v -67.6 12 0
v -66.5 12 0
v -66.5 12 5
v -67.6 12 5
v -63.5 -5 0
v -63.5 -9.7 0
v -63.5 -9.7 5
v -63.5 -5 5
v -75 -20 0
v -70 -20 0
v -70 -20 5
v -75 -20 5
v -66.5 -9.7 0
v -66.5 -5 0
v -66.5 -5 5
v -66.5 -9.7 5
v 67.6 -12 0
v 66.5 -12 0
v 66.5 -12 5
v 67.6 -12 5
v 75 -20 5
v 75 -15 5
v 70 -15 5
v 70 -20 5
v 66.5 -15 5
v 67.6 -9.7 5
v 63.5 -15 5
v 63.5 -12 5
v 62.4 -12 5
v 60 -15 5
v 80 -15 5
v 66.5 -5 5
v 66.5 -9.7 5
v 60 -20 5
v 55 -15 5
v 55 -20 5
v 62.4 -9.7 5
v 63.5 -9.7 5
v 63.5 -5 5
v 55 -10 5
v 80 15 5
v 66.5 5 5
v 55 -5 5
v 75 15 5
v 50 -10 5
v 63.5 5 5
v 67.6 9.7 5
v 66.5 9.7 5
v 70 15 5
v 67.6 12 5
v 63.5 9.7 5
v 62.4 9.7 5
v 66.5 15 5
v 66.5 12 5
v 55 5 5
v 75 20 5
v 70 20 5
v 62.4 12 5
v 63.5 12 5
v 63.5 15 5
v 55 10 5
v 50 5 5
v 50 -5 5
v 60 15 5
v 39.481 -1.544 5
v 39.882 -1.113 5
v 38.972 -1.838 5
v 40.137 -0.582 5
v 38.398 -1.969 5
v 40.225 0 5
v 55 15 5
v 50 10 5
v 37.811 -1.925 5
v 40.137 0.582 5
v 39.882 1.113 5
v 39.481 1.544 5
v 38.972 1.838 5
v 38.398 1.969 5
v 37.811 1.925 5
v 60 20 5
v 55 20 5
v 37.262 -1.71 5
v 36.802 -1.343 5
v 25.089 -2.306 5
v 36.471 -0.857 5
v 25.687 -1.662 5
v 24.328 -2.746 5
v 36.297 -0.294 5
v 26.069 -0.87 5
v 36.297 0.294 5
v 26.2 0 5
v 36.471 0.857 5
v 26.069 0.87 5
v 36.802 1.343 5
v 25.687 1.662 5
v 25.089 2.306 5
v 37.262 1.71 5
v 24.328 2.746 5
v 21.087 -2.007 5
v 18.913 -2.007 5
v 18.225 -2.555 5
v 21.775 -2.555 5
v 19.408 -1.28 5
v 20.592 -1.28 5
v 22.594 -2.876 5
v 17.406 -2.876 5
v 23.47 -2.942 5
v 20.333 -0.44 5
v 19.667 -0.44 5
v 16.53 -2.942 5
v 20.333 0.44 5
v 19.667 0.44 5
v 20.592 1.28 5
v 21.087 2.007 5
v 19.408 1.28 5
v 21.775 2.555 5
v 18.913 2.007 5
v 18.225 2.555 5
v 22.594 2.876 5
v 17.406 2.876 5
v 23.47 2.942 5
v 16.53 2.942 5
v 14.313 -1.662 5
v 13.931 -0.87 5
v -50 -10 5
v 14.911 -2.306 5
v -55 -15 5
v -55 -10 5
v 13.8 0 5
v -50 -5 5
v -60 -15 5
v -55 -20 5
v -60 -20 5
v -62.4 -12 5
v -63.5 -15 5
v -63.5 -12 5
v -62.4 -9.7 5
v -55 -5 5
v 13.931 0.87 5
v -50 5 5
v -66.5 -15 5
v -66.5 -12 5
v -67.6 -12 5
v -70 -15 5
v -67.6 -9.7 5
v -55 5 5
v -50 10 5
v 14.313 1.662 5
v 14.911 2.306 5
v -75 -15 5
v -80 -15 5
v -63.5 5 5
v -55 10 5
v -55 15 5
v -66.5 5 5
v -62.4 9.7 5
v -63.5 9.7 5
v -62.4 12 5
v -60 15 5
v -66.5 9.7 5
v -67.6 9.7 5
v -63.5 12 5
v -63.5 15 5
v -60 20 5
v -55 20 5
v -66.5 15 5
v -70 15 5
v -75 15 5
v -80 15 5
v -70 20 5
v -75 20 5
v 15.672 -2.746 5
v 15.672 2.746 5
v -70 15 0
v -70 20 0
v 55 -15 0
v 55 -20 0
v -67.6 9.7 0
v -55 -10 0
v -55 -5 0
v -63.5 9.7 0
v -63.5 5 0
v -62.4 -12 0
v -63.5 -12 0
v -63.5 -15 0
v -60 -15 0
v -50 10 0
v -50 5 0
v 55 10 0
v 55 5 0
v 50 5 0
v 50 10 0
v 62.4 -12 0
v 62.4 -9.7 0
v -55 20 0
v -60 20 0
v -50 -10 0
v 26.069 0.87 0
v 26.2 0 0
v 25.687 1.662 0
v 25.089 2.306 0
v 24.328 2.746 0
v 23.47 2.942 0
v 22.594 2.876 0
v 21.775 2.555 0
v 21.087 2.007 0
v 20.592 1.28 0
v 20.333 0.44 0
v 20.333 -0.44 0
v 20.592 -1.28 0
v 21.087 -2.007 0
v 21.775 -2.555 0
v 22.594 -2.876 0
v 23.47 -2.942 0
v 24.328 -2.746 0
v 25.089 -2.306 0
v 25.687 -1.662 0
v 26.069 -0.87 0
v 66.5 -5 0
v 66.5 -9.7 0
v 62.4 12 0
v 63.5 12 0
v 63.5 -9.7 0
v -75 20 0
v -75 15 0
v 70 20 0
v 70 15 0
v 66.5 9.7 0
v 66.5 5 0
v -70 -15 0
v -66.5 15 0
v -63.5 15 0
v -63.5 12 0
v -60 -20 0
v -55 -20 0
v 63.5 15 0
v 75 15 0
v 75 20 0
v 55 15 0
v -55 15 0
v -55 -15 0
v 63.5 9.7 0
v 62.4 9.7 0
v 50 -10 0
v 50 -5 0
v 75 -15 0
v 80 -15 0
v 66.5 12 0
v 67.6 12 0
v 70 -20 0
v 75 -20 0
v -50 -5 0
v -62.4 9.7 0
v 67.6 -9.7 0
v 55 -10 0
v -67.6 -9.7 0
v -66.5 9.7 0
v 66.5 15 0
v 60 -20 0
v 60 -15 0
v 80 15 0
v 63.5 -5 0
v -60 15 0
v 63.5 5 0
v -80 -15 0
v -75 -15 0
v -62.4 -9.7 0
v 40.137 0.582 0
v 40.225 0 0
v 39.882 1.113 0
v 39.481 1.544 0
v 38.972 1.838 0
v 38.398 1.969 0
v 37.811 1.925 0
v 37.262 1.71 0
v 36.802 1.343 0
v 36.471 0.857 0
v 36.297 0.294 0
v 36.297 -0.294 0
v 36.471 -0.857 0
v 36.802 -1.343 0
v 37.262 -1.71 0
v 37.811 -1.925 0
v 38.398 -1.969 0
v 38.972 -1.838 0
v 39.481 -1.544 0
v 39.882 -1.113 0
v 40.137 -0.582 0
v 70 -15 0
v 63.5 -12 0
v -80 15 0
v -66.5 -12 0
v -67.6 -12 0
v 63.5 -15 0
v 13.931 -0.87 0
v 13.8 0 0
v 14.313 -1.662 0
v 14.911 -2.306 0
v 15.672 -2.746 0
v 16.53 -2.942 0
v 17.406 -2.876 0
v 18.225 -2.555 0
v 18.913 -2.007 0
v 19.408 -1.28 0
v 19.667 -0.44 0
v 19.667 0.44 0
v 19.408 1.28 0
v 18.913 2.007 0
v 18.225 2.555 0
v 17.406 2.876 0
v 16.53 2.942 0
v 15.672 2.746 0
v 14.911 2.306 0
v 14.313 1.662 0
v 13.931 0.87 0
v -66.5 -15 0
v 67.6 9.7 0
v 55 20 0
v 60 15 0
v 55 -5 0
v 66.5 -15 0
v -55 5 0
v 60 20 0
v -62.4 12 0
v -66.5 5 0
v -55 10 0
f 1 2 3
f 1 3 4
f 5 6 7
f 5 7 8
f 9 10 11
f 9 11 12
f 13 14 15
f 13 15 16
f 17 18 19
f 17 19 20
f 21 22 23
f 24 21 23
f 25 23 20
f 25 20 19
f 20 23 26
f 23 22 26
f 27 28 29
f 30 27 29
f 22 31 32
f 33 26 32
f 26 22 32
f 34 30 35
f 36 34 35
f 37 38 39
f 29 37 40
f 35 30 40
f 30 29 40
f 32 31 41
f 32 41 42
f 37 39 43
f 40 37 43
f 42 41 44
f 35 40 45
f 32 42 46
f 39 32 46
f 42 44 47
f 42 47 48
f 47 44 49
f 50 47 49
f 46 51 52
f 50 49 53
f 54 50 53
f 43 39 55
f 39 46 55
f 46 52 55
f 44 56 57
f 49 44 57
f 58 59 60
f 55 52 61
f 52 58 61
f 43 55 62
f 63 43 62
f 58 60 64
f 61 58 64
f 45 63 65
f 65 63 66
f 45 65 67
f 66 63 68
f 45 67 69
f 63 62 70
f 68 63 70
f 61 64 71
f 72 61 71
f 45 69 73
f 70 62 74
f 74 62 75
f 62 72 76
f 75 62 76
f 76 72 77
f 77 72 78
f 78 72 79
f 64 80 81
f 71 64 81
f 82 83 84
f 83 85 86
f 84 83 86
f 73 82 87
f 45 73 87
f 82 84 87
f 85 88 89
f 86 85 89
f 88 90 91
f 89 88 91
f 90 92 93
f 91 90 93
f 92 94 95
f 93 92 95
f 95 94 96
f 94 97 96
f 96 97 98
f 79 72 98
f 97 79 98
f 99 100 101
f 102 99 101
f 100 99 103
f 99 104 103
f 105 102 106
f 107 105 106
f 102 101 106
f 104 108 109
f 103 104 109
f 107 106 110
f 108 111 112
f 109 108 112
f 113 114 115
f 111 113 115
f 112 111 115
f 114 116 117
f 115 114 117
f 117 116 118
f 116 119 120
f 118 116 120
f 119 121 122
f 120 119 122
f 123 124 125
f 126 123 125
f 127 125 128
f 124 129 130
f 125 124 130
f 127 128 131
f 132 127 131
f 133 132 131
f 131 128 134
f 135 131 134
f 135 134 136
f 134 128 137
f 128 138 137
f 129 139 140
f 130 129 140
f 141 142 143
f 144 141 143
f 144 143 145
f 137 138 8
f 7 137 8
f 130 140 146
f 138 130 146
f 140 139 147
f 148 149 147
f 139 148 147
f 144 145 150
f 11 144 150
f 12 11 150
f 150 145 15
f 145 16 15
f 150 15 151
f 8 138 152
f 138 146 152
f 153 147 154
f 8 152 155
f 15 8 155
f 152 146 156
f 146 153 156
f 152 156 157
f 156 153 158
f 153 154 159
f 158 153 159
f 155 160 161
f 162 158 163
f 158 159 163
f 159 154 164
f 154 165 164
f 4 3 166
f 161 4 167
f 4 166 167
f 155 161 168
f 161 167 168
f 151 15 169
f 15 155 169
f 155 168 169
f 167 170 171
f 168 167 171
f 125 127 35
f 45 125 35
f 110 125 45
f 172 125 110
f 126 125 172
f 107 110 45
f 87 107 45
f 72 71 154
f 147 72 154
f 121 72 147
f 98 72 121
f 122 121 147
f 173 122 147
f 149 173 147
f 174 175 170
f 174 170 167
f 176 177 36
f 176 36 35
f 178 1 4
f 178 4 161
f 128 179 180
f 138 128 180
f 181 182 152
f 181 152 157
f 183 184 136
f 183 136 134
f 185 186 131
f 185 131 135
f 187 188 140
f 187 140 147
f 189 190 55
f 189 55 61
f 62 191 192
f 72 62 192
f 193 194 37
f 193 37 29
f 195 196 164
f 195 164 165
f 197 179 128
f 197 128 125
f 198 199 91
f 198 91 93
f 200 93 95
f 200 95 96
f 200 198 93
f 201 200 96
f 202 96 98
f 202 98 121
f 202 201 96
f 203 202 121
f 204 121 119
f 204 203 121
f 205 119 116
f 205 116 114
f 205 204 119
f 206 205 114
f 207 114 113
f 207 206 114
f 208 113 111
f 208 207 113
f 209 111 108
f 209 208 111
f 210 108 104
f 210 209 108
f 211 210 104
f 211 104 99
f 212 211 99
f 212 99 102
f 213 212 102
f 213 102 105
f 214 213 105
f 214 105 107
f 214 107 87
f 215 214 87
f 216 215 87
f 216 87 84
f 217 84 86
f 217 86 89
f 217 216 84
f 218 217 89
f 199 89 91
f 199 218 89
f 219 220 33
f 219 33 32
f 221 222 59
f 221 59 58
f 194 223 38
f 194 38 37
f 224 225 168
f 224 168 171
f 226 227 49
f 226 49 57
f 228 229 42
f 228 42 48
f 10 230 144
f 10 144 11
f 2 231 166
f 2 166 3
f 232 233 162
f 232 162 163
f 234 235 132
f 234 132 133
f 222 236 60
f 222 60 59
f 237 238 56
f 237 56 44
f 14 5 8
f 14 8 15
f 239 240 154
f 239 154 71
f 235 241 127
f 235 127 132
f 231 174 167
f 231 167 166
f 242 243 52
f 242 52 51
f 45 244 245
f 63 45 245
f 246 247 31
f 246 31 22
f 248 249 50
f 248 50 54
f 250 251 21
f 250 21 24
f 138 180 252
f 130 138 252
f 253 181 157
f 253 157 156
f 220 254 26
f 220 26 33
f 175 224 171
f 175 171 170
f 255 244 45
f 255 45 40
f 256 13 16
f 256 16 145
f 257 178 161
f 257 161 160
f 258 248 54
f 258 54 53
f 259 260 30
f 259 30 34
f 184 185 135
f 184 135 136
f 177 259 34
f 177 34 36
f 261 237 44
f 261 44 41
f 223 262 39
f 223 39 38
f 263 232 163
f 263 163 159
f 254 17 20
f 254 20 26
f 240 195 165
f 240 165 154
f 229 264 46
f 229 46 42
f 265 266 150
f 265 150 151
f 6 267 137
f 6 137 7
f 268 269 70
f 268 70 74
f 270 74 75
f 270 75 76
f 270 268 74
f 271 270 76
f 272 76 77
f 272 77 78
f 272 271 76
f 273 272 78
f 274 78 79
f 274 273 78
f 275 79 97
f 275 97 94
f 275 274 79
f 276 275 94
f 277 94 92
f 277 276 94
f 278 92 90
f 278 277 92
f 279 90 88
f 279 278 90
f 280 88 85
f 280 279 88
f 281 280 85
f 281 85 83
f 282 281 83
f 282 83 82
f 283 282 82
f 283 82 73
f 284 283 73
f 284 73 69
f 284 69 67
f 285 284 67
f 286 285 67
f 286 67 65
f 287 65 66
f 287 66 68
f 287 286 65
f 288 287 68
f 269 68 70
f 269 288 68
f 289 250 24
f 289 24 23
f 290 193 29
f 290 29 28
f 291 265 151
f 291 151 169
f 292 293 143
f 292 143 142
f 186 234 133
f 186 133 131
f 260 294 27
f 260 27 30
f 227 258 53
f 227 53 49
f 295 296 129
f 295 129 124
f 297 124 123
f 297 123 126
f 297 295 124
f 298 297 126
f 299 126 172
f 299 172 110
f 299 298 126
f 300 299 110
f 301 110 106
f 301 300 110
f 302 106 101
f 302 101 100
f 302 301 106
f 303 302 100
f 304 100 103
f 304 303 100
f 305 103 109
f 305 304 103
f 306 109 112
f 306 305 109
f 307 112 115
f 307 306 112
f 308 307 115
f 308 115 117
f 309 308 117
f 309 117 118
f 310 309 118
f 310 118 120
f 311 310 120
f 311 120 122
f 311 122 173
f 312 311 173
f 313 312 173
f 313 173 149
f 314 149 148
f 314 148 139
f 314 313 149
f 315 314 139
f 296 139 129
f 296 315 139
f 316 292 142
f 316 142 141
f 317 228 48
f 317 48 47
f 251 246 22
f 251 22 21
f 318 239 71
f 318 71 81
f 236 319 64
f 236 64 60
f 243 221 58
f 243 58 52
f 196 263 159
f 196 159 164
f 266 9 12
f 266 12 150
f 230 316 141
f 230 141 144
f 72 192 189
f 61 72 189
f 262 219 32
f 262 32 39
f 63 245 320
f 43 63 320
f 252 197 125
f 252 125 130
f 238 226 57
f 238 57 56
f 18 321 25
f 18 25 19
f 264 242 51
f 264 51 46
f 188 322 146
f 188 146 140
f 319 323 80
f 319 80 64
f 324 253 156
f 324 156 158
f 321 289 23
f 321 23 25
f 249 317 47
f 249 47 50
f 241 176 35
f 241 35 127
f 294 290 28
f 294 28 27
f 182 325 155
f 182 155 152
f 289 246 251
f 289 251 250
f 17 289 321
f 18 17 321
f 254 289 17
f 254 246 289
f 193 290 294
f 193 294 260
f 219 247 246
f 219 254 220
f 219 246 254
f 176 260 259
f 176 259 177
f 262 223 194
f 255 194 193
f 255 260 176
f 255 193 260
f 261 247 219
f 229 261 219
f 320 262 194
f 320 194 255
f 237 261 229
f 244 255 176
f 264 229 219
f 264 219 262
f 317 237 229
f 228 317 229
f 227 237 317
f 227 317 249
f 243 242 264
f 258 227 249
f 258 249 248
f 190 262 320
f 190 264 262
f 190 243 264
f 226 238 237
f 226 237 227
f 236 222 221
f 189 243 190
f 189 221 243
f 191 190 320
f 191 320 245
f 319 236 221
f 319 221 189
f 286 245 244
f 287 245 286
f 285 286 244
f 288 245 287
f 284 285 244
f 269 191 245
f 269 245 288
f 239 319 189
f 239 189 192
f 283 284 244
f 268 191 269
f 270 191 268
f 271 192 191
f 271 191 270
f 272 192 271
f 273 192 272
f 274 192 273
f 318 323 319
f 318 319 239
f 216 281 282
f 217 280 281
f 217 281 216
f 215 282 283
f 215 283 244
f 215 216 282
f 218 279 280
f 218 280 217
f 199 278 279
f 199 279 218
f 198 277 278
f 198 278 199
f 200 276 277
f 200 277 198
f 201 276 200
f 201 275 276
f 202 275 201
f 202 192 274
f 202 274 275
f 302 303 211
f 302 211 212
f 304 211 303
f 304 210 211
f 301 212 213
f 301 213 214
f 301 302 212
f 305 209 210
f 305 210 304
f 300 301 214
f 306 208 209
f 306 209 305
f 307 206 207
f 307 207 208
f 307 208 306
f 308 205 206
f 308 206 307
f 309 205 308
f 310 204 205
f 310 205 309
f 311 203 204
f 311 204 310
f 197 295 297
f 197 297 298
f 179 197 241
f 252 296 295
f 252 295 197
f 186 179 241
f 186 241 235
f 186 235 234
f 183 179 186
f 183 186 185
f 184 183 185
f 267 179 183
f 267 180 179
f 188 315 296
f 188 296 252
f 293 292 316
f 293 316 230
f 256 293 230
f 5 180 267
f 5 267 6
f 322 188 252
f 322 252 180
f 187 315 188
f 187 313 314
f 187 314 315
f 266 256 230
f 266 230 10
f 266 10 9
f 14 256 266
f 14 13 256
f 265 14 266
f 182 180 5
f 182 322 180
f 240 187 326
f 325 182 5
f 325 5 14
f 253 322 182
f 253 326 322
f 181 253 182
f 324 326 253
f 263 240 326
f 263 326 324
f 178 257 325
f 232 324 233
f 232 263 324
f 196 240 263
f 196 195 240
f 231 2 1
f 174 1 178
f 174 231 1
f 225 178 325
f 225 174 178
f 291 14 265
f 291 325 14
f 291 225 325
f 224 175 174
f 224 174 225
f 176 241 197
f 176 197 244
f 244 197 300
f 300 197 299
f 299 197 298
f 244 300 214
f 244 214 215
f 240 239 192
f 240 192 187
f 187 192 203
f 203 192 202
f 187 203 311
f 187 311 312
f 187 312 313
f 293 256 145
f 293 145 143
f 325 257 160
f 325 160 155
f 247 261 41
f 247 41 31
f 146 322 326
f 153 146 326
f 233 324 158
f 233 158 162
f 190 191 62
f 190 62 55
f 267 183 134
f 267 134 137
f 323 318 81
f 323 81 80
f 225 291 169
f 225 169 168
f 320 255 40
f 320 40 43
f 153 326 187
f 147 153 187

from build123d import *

# Parameters (mm, degrees)
SKETCH2_R           = 2.95
SKETCH2_R_2         = 1.975
SKETCH2_W           = 5
SKETCH2_H           = 5
BOSS_EXTRUDE1_DEPTH = 5


with BuildPart() as part:
    # Sketch2 → Boss-Extrude1 (new body)
    with BuildSketch(Plane.XY):
        Polygon((66.5, 15), (70, 15), (70, 20), (75, 20), (75, 15), (80, 15), (80, -15), (75, -15), (75, -20), (70, -20), (70, -15), (66.5, -15), (66.5, -12), (67.6, -12), (67.6, -9.7), (66.5, -9.7), (66.5, -5), (63.5, -5), (63.5, -9.7), (62.4, -9.7), (62.4, -12), (63.5, -12), (63.5, -15), (60, -15), (60, -20), (55, -20), (55, -15), (-55, -15), (-55, -20), (-60, -20), (-60, -15), (-63.5, -15), (-63.5, -12), (-62.4, -12), (-62.4, -9.7), (-63.5, -9.7), (-63.5, -5), (-66.5, -5), (-66.5, -9.7), (-67.6, -9.7), (-67.6, -12), (-66.5, -12), (-66.5, -15), (-70, -15), (-70, -20), (-75, -20), (-75, -15), (-80, -15), (-80, 15), (-75, 15), (-75, 20), (-70, 20), (-70, 15), (-66.5, 15), (-66.5, 12), (-67.6, 12), (-67.6, 9.7), (-66.5, 9.7), (-66.5, 5), (-63.5, 5), (-63.5, 9.7), (-62.4, 9.7), (-62.4, 12), (-63.5, 12), (-63.5, 15), (-60, 15), (-60, 20), (-55, 20), (-55, 15), (55, 15), (55, 20), (60, 20), (60, 15), (63.5, 15), (63.5, 12), (62.4, 12), (62.4, 9.7), (63.5, 9.7), (63.5, 5), (66.5, 5), (66.5, 9.7), (67.6, 9.7), (67.6, 12), (66.5, 12), align=None)
        with Locations((23.25, 0)):
            Circle(SKETCH2_R, mode=Mode.SUBTRACT)
        with Locations(Location((16.75, 0, 0), (0, 0, 180))):
            Circle(SKETCH2_R, mode=Mode.SUBTRACT)
        with Locations((38.25, 0)):
            Circle(SKETCH2_R_2, mode=Mode.SUBTRACT)
        with Locations((-52.5, 7.5)):
            Rectangle(SKETCH2_W, SKETCH2_H, mode=Mode.SUBTRACT)
        with Locations((-52.5, -7.5)):
            Rectangle(SKETCH2_W, SKETCH2_H, mode=Mode.SUBTRACT)
        with Locations((52.5, 7.5)):
            Rectangle(SKETCH2_W, SKETCH2_H, mode=Mode.SUBTRACT)
        with Locations((52.5, -7.5)):
            Rectangle(SKETCH2_W, SKETCH2_H, mode=Mode.SUBTRACT)
    extrude(amount=BOSS_EXTRUDE1_DEPTH)


solid = part.part
